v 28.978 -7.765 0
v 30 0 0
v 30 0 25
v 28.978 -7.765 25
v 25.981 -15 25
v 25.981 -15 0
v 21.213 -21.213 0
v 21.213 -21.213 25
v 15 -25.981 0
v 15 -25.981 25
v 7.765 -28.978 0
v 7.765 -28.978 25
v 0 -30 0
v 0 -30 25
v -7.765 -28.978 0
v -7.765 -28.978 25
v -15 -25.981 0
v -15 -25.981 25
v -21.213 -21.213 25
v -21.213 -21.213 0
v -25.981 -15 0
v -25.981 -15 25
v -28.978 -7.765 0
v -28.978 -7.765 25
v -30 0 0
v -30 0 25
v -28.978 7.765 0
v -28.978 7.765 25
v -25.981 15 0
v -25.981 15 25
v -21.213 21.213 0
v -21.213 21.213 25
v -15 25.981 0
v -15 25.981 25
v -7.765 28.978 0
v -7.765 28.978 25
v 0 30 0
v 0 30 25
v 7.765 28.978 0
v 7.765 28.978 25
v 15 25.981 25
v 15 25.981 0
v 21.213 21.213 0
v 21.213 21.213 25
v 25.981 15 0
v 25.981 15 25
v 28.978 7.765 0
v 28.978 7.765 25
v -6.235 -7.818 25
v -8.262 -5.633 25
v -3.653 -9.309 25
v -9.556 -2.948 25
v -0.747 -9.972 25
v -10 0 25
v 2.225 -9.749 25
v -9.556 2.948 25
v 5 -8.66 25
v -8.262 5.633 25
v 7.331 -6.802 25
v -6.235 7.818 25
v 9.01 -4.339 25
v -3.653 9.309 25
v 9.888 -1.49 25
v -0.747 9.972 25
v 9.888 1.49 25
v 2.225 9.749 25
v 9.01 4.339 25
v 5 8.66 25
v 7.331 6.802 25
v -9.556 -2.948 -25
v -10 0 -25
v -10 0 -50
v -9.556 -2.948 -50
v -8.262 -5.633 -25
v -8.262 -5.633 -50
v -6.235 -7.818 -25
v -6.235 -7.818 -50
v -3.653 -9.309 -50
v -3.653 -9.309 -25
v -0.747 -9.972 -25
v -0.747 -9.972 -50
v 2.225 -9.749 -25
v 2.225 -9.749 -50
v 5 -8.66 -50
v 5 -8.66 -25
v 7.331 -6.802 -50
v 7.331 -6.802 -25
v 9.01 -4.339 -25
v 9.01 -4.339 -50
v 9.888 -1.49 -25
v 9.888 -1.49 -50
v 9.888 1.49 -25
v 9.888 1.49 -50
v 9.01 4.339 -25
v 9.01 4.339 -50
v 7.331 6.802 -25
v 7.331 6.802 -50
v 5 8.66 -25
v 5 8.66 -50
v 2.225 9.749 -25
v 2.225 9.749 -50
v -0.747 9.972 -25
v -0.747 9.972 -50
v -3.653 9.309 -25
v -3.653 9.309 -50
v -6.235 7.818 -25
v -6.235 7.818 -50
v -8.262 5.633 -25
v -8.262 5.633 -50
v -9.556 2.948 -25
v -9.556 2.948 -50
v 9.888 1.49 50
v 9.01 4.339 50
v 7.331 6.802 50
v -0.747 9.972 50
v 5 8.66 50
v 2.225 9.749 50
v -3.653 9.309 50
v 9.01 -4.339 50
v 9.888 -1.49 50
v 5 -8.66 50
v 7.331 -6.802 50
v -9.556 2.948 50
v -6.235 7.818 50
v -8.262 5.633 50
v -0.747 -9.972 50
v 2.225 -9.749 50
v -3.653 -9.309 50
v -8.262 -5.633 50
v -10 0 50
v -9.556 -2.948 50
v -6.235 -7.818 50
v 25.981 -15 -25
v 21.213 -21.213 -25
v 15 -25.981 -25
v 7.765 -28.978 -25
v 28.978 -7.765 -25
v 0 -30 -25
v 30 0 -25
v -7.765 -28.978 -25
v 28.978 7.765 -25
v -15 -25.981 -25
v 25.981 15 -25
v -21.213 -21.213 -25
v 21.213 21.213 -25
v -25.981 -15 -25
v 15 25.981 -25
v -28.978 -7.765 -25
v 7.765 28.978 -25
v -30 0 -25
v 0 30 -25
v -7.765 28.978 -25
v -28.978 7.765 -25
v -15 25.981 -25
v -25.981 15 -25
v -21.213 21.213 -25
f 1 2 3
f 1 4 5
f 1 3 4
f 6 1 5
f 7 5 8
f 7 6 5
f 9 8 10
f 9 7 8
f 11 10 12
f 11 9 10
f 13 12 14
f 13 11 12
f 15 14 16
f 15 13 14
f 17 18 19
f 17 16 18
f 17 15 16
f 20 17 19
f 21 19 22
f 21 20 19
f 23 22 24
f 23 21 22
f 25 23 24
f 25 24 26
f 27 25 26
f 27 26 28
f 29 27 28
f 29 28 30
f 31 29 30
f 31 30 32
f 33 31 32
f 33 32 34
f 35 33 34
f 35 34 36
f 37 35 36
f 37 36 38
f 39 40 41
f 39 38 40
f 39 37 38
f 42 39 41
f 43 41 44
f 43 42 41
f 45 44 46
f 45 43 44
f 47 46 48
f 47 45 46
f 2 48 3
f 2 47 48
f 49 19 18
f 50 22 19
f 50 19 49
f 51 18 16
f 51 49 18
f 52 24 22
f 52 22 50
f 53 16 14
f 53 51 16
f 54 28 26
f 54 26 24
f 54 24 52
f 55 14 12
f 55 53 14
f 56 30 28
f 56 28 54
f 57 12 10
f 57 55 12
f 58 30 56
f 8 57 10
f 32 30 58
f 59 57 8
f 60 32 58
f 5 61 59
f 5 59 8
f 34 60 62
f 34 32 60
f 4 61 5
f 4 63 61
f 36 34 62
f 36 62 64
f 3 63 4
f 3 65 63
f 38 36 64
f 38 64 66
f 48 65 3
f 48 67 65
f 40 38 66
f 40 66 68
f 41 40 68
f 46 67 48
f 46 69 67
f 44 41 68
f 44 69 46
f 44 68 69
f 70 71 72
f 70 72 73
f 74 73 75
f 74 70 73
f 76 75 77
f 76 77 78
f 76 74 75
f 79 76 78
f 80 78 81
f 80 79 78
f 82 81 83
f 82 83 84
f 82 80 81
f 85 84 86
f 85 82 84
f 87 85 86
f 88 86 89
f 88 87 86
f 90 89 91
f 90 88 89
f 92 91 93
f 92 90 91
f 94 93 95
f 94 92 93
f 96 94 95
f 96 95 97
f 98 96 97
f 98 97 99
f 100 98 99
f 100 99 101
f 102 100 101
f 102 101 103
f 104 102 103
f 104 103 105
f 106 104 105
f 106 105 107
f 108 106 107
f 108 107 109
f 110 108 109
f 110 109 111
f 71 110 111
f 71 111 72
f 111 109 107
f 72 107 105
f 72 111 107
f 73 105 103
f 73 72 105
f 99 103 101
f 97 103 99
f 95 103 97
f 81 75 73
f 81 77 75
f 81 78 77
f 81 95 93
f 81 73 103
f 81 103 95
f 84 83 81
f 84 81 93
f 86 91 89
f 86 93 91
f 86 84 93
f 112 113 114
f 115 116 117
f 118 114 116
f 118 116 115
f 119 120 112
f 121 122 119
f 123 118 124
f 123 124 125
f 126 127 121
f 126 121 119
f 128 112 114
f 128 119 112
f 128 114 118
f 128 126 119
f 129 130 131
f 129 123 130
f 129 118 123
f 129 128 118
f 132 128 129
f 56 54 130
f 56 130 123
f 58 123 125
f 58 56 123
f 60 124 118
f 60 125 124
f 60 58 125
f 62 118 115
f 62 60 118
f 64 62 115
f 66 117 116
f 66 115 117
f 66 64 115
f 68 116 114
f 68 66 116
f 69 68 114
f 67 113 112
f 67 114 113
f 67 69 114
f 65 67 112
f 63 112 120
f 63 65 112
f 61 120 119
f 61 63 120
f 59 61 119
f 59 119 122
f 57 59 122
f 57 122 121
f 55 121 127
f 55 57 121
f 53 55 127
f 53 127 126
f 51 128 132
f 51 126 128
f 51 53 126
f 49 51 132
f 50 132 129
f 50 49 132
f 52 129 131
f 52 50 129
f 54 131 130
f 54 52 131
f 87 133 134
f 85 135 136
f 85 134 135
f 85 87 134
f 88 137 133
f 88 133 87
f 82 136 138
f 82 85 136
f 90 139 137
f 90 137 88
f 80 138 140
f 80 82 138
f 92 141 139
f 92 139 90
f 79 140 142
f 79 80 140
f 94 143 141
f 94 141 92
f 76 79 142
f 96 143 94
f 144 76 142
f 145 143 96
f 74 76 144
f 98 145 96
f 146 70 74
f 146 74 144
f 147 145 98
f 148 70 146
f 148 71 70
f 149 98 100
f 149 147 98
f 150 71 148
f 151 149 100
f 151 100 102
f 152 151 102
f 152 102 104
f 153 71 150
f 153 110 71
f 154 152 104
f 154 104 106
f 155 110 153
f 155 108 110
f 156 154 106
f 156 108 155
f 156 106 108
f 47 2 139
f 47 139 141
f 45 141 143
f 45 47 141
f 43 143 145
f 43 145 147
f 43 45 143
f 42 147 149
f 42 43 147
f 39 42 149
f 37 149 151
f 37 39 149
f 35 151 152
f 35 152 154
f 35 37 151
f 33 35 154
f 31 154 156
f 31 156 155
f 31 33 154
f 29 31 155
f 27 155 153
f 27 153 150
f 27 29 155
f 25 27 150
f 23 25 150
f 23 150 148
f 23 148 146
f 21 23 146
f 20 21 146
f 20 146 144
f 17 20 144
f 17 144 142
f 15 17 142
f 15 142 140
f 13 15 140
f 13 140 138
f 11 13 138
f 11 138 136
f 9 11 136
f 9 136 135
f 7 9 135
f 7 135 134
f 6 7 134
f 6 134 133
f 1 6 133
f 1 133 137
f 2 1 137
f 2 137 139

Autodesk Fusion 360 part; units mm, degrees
sketch "Sketch1" plane through (0, 0, 0) normal (0, 0, 1) x (1, 0, 0)
  circle A0 centre (0, 0) radius 30
  dimension "d1" = 60
extrude "Extrude1" add sketch "Sketch1" along normal blind 25
sketch "Sketch2" plane through (0, 0, 25) normal (0, 0, 1) x (-1, 0, 0)
  circle A0 centre (0, 0) radius 30
  circle A1 centre (0, 0) radius 10
  dimension "d4" = 20
extrude "Extrude2" add sketch "Sketch2" along normal blind 25 contours A1
mirror "Mirror1" about plane through (0, 0, 0) normal (0, 0, 1) of bodies 1 merged
